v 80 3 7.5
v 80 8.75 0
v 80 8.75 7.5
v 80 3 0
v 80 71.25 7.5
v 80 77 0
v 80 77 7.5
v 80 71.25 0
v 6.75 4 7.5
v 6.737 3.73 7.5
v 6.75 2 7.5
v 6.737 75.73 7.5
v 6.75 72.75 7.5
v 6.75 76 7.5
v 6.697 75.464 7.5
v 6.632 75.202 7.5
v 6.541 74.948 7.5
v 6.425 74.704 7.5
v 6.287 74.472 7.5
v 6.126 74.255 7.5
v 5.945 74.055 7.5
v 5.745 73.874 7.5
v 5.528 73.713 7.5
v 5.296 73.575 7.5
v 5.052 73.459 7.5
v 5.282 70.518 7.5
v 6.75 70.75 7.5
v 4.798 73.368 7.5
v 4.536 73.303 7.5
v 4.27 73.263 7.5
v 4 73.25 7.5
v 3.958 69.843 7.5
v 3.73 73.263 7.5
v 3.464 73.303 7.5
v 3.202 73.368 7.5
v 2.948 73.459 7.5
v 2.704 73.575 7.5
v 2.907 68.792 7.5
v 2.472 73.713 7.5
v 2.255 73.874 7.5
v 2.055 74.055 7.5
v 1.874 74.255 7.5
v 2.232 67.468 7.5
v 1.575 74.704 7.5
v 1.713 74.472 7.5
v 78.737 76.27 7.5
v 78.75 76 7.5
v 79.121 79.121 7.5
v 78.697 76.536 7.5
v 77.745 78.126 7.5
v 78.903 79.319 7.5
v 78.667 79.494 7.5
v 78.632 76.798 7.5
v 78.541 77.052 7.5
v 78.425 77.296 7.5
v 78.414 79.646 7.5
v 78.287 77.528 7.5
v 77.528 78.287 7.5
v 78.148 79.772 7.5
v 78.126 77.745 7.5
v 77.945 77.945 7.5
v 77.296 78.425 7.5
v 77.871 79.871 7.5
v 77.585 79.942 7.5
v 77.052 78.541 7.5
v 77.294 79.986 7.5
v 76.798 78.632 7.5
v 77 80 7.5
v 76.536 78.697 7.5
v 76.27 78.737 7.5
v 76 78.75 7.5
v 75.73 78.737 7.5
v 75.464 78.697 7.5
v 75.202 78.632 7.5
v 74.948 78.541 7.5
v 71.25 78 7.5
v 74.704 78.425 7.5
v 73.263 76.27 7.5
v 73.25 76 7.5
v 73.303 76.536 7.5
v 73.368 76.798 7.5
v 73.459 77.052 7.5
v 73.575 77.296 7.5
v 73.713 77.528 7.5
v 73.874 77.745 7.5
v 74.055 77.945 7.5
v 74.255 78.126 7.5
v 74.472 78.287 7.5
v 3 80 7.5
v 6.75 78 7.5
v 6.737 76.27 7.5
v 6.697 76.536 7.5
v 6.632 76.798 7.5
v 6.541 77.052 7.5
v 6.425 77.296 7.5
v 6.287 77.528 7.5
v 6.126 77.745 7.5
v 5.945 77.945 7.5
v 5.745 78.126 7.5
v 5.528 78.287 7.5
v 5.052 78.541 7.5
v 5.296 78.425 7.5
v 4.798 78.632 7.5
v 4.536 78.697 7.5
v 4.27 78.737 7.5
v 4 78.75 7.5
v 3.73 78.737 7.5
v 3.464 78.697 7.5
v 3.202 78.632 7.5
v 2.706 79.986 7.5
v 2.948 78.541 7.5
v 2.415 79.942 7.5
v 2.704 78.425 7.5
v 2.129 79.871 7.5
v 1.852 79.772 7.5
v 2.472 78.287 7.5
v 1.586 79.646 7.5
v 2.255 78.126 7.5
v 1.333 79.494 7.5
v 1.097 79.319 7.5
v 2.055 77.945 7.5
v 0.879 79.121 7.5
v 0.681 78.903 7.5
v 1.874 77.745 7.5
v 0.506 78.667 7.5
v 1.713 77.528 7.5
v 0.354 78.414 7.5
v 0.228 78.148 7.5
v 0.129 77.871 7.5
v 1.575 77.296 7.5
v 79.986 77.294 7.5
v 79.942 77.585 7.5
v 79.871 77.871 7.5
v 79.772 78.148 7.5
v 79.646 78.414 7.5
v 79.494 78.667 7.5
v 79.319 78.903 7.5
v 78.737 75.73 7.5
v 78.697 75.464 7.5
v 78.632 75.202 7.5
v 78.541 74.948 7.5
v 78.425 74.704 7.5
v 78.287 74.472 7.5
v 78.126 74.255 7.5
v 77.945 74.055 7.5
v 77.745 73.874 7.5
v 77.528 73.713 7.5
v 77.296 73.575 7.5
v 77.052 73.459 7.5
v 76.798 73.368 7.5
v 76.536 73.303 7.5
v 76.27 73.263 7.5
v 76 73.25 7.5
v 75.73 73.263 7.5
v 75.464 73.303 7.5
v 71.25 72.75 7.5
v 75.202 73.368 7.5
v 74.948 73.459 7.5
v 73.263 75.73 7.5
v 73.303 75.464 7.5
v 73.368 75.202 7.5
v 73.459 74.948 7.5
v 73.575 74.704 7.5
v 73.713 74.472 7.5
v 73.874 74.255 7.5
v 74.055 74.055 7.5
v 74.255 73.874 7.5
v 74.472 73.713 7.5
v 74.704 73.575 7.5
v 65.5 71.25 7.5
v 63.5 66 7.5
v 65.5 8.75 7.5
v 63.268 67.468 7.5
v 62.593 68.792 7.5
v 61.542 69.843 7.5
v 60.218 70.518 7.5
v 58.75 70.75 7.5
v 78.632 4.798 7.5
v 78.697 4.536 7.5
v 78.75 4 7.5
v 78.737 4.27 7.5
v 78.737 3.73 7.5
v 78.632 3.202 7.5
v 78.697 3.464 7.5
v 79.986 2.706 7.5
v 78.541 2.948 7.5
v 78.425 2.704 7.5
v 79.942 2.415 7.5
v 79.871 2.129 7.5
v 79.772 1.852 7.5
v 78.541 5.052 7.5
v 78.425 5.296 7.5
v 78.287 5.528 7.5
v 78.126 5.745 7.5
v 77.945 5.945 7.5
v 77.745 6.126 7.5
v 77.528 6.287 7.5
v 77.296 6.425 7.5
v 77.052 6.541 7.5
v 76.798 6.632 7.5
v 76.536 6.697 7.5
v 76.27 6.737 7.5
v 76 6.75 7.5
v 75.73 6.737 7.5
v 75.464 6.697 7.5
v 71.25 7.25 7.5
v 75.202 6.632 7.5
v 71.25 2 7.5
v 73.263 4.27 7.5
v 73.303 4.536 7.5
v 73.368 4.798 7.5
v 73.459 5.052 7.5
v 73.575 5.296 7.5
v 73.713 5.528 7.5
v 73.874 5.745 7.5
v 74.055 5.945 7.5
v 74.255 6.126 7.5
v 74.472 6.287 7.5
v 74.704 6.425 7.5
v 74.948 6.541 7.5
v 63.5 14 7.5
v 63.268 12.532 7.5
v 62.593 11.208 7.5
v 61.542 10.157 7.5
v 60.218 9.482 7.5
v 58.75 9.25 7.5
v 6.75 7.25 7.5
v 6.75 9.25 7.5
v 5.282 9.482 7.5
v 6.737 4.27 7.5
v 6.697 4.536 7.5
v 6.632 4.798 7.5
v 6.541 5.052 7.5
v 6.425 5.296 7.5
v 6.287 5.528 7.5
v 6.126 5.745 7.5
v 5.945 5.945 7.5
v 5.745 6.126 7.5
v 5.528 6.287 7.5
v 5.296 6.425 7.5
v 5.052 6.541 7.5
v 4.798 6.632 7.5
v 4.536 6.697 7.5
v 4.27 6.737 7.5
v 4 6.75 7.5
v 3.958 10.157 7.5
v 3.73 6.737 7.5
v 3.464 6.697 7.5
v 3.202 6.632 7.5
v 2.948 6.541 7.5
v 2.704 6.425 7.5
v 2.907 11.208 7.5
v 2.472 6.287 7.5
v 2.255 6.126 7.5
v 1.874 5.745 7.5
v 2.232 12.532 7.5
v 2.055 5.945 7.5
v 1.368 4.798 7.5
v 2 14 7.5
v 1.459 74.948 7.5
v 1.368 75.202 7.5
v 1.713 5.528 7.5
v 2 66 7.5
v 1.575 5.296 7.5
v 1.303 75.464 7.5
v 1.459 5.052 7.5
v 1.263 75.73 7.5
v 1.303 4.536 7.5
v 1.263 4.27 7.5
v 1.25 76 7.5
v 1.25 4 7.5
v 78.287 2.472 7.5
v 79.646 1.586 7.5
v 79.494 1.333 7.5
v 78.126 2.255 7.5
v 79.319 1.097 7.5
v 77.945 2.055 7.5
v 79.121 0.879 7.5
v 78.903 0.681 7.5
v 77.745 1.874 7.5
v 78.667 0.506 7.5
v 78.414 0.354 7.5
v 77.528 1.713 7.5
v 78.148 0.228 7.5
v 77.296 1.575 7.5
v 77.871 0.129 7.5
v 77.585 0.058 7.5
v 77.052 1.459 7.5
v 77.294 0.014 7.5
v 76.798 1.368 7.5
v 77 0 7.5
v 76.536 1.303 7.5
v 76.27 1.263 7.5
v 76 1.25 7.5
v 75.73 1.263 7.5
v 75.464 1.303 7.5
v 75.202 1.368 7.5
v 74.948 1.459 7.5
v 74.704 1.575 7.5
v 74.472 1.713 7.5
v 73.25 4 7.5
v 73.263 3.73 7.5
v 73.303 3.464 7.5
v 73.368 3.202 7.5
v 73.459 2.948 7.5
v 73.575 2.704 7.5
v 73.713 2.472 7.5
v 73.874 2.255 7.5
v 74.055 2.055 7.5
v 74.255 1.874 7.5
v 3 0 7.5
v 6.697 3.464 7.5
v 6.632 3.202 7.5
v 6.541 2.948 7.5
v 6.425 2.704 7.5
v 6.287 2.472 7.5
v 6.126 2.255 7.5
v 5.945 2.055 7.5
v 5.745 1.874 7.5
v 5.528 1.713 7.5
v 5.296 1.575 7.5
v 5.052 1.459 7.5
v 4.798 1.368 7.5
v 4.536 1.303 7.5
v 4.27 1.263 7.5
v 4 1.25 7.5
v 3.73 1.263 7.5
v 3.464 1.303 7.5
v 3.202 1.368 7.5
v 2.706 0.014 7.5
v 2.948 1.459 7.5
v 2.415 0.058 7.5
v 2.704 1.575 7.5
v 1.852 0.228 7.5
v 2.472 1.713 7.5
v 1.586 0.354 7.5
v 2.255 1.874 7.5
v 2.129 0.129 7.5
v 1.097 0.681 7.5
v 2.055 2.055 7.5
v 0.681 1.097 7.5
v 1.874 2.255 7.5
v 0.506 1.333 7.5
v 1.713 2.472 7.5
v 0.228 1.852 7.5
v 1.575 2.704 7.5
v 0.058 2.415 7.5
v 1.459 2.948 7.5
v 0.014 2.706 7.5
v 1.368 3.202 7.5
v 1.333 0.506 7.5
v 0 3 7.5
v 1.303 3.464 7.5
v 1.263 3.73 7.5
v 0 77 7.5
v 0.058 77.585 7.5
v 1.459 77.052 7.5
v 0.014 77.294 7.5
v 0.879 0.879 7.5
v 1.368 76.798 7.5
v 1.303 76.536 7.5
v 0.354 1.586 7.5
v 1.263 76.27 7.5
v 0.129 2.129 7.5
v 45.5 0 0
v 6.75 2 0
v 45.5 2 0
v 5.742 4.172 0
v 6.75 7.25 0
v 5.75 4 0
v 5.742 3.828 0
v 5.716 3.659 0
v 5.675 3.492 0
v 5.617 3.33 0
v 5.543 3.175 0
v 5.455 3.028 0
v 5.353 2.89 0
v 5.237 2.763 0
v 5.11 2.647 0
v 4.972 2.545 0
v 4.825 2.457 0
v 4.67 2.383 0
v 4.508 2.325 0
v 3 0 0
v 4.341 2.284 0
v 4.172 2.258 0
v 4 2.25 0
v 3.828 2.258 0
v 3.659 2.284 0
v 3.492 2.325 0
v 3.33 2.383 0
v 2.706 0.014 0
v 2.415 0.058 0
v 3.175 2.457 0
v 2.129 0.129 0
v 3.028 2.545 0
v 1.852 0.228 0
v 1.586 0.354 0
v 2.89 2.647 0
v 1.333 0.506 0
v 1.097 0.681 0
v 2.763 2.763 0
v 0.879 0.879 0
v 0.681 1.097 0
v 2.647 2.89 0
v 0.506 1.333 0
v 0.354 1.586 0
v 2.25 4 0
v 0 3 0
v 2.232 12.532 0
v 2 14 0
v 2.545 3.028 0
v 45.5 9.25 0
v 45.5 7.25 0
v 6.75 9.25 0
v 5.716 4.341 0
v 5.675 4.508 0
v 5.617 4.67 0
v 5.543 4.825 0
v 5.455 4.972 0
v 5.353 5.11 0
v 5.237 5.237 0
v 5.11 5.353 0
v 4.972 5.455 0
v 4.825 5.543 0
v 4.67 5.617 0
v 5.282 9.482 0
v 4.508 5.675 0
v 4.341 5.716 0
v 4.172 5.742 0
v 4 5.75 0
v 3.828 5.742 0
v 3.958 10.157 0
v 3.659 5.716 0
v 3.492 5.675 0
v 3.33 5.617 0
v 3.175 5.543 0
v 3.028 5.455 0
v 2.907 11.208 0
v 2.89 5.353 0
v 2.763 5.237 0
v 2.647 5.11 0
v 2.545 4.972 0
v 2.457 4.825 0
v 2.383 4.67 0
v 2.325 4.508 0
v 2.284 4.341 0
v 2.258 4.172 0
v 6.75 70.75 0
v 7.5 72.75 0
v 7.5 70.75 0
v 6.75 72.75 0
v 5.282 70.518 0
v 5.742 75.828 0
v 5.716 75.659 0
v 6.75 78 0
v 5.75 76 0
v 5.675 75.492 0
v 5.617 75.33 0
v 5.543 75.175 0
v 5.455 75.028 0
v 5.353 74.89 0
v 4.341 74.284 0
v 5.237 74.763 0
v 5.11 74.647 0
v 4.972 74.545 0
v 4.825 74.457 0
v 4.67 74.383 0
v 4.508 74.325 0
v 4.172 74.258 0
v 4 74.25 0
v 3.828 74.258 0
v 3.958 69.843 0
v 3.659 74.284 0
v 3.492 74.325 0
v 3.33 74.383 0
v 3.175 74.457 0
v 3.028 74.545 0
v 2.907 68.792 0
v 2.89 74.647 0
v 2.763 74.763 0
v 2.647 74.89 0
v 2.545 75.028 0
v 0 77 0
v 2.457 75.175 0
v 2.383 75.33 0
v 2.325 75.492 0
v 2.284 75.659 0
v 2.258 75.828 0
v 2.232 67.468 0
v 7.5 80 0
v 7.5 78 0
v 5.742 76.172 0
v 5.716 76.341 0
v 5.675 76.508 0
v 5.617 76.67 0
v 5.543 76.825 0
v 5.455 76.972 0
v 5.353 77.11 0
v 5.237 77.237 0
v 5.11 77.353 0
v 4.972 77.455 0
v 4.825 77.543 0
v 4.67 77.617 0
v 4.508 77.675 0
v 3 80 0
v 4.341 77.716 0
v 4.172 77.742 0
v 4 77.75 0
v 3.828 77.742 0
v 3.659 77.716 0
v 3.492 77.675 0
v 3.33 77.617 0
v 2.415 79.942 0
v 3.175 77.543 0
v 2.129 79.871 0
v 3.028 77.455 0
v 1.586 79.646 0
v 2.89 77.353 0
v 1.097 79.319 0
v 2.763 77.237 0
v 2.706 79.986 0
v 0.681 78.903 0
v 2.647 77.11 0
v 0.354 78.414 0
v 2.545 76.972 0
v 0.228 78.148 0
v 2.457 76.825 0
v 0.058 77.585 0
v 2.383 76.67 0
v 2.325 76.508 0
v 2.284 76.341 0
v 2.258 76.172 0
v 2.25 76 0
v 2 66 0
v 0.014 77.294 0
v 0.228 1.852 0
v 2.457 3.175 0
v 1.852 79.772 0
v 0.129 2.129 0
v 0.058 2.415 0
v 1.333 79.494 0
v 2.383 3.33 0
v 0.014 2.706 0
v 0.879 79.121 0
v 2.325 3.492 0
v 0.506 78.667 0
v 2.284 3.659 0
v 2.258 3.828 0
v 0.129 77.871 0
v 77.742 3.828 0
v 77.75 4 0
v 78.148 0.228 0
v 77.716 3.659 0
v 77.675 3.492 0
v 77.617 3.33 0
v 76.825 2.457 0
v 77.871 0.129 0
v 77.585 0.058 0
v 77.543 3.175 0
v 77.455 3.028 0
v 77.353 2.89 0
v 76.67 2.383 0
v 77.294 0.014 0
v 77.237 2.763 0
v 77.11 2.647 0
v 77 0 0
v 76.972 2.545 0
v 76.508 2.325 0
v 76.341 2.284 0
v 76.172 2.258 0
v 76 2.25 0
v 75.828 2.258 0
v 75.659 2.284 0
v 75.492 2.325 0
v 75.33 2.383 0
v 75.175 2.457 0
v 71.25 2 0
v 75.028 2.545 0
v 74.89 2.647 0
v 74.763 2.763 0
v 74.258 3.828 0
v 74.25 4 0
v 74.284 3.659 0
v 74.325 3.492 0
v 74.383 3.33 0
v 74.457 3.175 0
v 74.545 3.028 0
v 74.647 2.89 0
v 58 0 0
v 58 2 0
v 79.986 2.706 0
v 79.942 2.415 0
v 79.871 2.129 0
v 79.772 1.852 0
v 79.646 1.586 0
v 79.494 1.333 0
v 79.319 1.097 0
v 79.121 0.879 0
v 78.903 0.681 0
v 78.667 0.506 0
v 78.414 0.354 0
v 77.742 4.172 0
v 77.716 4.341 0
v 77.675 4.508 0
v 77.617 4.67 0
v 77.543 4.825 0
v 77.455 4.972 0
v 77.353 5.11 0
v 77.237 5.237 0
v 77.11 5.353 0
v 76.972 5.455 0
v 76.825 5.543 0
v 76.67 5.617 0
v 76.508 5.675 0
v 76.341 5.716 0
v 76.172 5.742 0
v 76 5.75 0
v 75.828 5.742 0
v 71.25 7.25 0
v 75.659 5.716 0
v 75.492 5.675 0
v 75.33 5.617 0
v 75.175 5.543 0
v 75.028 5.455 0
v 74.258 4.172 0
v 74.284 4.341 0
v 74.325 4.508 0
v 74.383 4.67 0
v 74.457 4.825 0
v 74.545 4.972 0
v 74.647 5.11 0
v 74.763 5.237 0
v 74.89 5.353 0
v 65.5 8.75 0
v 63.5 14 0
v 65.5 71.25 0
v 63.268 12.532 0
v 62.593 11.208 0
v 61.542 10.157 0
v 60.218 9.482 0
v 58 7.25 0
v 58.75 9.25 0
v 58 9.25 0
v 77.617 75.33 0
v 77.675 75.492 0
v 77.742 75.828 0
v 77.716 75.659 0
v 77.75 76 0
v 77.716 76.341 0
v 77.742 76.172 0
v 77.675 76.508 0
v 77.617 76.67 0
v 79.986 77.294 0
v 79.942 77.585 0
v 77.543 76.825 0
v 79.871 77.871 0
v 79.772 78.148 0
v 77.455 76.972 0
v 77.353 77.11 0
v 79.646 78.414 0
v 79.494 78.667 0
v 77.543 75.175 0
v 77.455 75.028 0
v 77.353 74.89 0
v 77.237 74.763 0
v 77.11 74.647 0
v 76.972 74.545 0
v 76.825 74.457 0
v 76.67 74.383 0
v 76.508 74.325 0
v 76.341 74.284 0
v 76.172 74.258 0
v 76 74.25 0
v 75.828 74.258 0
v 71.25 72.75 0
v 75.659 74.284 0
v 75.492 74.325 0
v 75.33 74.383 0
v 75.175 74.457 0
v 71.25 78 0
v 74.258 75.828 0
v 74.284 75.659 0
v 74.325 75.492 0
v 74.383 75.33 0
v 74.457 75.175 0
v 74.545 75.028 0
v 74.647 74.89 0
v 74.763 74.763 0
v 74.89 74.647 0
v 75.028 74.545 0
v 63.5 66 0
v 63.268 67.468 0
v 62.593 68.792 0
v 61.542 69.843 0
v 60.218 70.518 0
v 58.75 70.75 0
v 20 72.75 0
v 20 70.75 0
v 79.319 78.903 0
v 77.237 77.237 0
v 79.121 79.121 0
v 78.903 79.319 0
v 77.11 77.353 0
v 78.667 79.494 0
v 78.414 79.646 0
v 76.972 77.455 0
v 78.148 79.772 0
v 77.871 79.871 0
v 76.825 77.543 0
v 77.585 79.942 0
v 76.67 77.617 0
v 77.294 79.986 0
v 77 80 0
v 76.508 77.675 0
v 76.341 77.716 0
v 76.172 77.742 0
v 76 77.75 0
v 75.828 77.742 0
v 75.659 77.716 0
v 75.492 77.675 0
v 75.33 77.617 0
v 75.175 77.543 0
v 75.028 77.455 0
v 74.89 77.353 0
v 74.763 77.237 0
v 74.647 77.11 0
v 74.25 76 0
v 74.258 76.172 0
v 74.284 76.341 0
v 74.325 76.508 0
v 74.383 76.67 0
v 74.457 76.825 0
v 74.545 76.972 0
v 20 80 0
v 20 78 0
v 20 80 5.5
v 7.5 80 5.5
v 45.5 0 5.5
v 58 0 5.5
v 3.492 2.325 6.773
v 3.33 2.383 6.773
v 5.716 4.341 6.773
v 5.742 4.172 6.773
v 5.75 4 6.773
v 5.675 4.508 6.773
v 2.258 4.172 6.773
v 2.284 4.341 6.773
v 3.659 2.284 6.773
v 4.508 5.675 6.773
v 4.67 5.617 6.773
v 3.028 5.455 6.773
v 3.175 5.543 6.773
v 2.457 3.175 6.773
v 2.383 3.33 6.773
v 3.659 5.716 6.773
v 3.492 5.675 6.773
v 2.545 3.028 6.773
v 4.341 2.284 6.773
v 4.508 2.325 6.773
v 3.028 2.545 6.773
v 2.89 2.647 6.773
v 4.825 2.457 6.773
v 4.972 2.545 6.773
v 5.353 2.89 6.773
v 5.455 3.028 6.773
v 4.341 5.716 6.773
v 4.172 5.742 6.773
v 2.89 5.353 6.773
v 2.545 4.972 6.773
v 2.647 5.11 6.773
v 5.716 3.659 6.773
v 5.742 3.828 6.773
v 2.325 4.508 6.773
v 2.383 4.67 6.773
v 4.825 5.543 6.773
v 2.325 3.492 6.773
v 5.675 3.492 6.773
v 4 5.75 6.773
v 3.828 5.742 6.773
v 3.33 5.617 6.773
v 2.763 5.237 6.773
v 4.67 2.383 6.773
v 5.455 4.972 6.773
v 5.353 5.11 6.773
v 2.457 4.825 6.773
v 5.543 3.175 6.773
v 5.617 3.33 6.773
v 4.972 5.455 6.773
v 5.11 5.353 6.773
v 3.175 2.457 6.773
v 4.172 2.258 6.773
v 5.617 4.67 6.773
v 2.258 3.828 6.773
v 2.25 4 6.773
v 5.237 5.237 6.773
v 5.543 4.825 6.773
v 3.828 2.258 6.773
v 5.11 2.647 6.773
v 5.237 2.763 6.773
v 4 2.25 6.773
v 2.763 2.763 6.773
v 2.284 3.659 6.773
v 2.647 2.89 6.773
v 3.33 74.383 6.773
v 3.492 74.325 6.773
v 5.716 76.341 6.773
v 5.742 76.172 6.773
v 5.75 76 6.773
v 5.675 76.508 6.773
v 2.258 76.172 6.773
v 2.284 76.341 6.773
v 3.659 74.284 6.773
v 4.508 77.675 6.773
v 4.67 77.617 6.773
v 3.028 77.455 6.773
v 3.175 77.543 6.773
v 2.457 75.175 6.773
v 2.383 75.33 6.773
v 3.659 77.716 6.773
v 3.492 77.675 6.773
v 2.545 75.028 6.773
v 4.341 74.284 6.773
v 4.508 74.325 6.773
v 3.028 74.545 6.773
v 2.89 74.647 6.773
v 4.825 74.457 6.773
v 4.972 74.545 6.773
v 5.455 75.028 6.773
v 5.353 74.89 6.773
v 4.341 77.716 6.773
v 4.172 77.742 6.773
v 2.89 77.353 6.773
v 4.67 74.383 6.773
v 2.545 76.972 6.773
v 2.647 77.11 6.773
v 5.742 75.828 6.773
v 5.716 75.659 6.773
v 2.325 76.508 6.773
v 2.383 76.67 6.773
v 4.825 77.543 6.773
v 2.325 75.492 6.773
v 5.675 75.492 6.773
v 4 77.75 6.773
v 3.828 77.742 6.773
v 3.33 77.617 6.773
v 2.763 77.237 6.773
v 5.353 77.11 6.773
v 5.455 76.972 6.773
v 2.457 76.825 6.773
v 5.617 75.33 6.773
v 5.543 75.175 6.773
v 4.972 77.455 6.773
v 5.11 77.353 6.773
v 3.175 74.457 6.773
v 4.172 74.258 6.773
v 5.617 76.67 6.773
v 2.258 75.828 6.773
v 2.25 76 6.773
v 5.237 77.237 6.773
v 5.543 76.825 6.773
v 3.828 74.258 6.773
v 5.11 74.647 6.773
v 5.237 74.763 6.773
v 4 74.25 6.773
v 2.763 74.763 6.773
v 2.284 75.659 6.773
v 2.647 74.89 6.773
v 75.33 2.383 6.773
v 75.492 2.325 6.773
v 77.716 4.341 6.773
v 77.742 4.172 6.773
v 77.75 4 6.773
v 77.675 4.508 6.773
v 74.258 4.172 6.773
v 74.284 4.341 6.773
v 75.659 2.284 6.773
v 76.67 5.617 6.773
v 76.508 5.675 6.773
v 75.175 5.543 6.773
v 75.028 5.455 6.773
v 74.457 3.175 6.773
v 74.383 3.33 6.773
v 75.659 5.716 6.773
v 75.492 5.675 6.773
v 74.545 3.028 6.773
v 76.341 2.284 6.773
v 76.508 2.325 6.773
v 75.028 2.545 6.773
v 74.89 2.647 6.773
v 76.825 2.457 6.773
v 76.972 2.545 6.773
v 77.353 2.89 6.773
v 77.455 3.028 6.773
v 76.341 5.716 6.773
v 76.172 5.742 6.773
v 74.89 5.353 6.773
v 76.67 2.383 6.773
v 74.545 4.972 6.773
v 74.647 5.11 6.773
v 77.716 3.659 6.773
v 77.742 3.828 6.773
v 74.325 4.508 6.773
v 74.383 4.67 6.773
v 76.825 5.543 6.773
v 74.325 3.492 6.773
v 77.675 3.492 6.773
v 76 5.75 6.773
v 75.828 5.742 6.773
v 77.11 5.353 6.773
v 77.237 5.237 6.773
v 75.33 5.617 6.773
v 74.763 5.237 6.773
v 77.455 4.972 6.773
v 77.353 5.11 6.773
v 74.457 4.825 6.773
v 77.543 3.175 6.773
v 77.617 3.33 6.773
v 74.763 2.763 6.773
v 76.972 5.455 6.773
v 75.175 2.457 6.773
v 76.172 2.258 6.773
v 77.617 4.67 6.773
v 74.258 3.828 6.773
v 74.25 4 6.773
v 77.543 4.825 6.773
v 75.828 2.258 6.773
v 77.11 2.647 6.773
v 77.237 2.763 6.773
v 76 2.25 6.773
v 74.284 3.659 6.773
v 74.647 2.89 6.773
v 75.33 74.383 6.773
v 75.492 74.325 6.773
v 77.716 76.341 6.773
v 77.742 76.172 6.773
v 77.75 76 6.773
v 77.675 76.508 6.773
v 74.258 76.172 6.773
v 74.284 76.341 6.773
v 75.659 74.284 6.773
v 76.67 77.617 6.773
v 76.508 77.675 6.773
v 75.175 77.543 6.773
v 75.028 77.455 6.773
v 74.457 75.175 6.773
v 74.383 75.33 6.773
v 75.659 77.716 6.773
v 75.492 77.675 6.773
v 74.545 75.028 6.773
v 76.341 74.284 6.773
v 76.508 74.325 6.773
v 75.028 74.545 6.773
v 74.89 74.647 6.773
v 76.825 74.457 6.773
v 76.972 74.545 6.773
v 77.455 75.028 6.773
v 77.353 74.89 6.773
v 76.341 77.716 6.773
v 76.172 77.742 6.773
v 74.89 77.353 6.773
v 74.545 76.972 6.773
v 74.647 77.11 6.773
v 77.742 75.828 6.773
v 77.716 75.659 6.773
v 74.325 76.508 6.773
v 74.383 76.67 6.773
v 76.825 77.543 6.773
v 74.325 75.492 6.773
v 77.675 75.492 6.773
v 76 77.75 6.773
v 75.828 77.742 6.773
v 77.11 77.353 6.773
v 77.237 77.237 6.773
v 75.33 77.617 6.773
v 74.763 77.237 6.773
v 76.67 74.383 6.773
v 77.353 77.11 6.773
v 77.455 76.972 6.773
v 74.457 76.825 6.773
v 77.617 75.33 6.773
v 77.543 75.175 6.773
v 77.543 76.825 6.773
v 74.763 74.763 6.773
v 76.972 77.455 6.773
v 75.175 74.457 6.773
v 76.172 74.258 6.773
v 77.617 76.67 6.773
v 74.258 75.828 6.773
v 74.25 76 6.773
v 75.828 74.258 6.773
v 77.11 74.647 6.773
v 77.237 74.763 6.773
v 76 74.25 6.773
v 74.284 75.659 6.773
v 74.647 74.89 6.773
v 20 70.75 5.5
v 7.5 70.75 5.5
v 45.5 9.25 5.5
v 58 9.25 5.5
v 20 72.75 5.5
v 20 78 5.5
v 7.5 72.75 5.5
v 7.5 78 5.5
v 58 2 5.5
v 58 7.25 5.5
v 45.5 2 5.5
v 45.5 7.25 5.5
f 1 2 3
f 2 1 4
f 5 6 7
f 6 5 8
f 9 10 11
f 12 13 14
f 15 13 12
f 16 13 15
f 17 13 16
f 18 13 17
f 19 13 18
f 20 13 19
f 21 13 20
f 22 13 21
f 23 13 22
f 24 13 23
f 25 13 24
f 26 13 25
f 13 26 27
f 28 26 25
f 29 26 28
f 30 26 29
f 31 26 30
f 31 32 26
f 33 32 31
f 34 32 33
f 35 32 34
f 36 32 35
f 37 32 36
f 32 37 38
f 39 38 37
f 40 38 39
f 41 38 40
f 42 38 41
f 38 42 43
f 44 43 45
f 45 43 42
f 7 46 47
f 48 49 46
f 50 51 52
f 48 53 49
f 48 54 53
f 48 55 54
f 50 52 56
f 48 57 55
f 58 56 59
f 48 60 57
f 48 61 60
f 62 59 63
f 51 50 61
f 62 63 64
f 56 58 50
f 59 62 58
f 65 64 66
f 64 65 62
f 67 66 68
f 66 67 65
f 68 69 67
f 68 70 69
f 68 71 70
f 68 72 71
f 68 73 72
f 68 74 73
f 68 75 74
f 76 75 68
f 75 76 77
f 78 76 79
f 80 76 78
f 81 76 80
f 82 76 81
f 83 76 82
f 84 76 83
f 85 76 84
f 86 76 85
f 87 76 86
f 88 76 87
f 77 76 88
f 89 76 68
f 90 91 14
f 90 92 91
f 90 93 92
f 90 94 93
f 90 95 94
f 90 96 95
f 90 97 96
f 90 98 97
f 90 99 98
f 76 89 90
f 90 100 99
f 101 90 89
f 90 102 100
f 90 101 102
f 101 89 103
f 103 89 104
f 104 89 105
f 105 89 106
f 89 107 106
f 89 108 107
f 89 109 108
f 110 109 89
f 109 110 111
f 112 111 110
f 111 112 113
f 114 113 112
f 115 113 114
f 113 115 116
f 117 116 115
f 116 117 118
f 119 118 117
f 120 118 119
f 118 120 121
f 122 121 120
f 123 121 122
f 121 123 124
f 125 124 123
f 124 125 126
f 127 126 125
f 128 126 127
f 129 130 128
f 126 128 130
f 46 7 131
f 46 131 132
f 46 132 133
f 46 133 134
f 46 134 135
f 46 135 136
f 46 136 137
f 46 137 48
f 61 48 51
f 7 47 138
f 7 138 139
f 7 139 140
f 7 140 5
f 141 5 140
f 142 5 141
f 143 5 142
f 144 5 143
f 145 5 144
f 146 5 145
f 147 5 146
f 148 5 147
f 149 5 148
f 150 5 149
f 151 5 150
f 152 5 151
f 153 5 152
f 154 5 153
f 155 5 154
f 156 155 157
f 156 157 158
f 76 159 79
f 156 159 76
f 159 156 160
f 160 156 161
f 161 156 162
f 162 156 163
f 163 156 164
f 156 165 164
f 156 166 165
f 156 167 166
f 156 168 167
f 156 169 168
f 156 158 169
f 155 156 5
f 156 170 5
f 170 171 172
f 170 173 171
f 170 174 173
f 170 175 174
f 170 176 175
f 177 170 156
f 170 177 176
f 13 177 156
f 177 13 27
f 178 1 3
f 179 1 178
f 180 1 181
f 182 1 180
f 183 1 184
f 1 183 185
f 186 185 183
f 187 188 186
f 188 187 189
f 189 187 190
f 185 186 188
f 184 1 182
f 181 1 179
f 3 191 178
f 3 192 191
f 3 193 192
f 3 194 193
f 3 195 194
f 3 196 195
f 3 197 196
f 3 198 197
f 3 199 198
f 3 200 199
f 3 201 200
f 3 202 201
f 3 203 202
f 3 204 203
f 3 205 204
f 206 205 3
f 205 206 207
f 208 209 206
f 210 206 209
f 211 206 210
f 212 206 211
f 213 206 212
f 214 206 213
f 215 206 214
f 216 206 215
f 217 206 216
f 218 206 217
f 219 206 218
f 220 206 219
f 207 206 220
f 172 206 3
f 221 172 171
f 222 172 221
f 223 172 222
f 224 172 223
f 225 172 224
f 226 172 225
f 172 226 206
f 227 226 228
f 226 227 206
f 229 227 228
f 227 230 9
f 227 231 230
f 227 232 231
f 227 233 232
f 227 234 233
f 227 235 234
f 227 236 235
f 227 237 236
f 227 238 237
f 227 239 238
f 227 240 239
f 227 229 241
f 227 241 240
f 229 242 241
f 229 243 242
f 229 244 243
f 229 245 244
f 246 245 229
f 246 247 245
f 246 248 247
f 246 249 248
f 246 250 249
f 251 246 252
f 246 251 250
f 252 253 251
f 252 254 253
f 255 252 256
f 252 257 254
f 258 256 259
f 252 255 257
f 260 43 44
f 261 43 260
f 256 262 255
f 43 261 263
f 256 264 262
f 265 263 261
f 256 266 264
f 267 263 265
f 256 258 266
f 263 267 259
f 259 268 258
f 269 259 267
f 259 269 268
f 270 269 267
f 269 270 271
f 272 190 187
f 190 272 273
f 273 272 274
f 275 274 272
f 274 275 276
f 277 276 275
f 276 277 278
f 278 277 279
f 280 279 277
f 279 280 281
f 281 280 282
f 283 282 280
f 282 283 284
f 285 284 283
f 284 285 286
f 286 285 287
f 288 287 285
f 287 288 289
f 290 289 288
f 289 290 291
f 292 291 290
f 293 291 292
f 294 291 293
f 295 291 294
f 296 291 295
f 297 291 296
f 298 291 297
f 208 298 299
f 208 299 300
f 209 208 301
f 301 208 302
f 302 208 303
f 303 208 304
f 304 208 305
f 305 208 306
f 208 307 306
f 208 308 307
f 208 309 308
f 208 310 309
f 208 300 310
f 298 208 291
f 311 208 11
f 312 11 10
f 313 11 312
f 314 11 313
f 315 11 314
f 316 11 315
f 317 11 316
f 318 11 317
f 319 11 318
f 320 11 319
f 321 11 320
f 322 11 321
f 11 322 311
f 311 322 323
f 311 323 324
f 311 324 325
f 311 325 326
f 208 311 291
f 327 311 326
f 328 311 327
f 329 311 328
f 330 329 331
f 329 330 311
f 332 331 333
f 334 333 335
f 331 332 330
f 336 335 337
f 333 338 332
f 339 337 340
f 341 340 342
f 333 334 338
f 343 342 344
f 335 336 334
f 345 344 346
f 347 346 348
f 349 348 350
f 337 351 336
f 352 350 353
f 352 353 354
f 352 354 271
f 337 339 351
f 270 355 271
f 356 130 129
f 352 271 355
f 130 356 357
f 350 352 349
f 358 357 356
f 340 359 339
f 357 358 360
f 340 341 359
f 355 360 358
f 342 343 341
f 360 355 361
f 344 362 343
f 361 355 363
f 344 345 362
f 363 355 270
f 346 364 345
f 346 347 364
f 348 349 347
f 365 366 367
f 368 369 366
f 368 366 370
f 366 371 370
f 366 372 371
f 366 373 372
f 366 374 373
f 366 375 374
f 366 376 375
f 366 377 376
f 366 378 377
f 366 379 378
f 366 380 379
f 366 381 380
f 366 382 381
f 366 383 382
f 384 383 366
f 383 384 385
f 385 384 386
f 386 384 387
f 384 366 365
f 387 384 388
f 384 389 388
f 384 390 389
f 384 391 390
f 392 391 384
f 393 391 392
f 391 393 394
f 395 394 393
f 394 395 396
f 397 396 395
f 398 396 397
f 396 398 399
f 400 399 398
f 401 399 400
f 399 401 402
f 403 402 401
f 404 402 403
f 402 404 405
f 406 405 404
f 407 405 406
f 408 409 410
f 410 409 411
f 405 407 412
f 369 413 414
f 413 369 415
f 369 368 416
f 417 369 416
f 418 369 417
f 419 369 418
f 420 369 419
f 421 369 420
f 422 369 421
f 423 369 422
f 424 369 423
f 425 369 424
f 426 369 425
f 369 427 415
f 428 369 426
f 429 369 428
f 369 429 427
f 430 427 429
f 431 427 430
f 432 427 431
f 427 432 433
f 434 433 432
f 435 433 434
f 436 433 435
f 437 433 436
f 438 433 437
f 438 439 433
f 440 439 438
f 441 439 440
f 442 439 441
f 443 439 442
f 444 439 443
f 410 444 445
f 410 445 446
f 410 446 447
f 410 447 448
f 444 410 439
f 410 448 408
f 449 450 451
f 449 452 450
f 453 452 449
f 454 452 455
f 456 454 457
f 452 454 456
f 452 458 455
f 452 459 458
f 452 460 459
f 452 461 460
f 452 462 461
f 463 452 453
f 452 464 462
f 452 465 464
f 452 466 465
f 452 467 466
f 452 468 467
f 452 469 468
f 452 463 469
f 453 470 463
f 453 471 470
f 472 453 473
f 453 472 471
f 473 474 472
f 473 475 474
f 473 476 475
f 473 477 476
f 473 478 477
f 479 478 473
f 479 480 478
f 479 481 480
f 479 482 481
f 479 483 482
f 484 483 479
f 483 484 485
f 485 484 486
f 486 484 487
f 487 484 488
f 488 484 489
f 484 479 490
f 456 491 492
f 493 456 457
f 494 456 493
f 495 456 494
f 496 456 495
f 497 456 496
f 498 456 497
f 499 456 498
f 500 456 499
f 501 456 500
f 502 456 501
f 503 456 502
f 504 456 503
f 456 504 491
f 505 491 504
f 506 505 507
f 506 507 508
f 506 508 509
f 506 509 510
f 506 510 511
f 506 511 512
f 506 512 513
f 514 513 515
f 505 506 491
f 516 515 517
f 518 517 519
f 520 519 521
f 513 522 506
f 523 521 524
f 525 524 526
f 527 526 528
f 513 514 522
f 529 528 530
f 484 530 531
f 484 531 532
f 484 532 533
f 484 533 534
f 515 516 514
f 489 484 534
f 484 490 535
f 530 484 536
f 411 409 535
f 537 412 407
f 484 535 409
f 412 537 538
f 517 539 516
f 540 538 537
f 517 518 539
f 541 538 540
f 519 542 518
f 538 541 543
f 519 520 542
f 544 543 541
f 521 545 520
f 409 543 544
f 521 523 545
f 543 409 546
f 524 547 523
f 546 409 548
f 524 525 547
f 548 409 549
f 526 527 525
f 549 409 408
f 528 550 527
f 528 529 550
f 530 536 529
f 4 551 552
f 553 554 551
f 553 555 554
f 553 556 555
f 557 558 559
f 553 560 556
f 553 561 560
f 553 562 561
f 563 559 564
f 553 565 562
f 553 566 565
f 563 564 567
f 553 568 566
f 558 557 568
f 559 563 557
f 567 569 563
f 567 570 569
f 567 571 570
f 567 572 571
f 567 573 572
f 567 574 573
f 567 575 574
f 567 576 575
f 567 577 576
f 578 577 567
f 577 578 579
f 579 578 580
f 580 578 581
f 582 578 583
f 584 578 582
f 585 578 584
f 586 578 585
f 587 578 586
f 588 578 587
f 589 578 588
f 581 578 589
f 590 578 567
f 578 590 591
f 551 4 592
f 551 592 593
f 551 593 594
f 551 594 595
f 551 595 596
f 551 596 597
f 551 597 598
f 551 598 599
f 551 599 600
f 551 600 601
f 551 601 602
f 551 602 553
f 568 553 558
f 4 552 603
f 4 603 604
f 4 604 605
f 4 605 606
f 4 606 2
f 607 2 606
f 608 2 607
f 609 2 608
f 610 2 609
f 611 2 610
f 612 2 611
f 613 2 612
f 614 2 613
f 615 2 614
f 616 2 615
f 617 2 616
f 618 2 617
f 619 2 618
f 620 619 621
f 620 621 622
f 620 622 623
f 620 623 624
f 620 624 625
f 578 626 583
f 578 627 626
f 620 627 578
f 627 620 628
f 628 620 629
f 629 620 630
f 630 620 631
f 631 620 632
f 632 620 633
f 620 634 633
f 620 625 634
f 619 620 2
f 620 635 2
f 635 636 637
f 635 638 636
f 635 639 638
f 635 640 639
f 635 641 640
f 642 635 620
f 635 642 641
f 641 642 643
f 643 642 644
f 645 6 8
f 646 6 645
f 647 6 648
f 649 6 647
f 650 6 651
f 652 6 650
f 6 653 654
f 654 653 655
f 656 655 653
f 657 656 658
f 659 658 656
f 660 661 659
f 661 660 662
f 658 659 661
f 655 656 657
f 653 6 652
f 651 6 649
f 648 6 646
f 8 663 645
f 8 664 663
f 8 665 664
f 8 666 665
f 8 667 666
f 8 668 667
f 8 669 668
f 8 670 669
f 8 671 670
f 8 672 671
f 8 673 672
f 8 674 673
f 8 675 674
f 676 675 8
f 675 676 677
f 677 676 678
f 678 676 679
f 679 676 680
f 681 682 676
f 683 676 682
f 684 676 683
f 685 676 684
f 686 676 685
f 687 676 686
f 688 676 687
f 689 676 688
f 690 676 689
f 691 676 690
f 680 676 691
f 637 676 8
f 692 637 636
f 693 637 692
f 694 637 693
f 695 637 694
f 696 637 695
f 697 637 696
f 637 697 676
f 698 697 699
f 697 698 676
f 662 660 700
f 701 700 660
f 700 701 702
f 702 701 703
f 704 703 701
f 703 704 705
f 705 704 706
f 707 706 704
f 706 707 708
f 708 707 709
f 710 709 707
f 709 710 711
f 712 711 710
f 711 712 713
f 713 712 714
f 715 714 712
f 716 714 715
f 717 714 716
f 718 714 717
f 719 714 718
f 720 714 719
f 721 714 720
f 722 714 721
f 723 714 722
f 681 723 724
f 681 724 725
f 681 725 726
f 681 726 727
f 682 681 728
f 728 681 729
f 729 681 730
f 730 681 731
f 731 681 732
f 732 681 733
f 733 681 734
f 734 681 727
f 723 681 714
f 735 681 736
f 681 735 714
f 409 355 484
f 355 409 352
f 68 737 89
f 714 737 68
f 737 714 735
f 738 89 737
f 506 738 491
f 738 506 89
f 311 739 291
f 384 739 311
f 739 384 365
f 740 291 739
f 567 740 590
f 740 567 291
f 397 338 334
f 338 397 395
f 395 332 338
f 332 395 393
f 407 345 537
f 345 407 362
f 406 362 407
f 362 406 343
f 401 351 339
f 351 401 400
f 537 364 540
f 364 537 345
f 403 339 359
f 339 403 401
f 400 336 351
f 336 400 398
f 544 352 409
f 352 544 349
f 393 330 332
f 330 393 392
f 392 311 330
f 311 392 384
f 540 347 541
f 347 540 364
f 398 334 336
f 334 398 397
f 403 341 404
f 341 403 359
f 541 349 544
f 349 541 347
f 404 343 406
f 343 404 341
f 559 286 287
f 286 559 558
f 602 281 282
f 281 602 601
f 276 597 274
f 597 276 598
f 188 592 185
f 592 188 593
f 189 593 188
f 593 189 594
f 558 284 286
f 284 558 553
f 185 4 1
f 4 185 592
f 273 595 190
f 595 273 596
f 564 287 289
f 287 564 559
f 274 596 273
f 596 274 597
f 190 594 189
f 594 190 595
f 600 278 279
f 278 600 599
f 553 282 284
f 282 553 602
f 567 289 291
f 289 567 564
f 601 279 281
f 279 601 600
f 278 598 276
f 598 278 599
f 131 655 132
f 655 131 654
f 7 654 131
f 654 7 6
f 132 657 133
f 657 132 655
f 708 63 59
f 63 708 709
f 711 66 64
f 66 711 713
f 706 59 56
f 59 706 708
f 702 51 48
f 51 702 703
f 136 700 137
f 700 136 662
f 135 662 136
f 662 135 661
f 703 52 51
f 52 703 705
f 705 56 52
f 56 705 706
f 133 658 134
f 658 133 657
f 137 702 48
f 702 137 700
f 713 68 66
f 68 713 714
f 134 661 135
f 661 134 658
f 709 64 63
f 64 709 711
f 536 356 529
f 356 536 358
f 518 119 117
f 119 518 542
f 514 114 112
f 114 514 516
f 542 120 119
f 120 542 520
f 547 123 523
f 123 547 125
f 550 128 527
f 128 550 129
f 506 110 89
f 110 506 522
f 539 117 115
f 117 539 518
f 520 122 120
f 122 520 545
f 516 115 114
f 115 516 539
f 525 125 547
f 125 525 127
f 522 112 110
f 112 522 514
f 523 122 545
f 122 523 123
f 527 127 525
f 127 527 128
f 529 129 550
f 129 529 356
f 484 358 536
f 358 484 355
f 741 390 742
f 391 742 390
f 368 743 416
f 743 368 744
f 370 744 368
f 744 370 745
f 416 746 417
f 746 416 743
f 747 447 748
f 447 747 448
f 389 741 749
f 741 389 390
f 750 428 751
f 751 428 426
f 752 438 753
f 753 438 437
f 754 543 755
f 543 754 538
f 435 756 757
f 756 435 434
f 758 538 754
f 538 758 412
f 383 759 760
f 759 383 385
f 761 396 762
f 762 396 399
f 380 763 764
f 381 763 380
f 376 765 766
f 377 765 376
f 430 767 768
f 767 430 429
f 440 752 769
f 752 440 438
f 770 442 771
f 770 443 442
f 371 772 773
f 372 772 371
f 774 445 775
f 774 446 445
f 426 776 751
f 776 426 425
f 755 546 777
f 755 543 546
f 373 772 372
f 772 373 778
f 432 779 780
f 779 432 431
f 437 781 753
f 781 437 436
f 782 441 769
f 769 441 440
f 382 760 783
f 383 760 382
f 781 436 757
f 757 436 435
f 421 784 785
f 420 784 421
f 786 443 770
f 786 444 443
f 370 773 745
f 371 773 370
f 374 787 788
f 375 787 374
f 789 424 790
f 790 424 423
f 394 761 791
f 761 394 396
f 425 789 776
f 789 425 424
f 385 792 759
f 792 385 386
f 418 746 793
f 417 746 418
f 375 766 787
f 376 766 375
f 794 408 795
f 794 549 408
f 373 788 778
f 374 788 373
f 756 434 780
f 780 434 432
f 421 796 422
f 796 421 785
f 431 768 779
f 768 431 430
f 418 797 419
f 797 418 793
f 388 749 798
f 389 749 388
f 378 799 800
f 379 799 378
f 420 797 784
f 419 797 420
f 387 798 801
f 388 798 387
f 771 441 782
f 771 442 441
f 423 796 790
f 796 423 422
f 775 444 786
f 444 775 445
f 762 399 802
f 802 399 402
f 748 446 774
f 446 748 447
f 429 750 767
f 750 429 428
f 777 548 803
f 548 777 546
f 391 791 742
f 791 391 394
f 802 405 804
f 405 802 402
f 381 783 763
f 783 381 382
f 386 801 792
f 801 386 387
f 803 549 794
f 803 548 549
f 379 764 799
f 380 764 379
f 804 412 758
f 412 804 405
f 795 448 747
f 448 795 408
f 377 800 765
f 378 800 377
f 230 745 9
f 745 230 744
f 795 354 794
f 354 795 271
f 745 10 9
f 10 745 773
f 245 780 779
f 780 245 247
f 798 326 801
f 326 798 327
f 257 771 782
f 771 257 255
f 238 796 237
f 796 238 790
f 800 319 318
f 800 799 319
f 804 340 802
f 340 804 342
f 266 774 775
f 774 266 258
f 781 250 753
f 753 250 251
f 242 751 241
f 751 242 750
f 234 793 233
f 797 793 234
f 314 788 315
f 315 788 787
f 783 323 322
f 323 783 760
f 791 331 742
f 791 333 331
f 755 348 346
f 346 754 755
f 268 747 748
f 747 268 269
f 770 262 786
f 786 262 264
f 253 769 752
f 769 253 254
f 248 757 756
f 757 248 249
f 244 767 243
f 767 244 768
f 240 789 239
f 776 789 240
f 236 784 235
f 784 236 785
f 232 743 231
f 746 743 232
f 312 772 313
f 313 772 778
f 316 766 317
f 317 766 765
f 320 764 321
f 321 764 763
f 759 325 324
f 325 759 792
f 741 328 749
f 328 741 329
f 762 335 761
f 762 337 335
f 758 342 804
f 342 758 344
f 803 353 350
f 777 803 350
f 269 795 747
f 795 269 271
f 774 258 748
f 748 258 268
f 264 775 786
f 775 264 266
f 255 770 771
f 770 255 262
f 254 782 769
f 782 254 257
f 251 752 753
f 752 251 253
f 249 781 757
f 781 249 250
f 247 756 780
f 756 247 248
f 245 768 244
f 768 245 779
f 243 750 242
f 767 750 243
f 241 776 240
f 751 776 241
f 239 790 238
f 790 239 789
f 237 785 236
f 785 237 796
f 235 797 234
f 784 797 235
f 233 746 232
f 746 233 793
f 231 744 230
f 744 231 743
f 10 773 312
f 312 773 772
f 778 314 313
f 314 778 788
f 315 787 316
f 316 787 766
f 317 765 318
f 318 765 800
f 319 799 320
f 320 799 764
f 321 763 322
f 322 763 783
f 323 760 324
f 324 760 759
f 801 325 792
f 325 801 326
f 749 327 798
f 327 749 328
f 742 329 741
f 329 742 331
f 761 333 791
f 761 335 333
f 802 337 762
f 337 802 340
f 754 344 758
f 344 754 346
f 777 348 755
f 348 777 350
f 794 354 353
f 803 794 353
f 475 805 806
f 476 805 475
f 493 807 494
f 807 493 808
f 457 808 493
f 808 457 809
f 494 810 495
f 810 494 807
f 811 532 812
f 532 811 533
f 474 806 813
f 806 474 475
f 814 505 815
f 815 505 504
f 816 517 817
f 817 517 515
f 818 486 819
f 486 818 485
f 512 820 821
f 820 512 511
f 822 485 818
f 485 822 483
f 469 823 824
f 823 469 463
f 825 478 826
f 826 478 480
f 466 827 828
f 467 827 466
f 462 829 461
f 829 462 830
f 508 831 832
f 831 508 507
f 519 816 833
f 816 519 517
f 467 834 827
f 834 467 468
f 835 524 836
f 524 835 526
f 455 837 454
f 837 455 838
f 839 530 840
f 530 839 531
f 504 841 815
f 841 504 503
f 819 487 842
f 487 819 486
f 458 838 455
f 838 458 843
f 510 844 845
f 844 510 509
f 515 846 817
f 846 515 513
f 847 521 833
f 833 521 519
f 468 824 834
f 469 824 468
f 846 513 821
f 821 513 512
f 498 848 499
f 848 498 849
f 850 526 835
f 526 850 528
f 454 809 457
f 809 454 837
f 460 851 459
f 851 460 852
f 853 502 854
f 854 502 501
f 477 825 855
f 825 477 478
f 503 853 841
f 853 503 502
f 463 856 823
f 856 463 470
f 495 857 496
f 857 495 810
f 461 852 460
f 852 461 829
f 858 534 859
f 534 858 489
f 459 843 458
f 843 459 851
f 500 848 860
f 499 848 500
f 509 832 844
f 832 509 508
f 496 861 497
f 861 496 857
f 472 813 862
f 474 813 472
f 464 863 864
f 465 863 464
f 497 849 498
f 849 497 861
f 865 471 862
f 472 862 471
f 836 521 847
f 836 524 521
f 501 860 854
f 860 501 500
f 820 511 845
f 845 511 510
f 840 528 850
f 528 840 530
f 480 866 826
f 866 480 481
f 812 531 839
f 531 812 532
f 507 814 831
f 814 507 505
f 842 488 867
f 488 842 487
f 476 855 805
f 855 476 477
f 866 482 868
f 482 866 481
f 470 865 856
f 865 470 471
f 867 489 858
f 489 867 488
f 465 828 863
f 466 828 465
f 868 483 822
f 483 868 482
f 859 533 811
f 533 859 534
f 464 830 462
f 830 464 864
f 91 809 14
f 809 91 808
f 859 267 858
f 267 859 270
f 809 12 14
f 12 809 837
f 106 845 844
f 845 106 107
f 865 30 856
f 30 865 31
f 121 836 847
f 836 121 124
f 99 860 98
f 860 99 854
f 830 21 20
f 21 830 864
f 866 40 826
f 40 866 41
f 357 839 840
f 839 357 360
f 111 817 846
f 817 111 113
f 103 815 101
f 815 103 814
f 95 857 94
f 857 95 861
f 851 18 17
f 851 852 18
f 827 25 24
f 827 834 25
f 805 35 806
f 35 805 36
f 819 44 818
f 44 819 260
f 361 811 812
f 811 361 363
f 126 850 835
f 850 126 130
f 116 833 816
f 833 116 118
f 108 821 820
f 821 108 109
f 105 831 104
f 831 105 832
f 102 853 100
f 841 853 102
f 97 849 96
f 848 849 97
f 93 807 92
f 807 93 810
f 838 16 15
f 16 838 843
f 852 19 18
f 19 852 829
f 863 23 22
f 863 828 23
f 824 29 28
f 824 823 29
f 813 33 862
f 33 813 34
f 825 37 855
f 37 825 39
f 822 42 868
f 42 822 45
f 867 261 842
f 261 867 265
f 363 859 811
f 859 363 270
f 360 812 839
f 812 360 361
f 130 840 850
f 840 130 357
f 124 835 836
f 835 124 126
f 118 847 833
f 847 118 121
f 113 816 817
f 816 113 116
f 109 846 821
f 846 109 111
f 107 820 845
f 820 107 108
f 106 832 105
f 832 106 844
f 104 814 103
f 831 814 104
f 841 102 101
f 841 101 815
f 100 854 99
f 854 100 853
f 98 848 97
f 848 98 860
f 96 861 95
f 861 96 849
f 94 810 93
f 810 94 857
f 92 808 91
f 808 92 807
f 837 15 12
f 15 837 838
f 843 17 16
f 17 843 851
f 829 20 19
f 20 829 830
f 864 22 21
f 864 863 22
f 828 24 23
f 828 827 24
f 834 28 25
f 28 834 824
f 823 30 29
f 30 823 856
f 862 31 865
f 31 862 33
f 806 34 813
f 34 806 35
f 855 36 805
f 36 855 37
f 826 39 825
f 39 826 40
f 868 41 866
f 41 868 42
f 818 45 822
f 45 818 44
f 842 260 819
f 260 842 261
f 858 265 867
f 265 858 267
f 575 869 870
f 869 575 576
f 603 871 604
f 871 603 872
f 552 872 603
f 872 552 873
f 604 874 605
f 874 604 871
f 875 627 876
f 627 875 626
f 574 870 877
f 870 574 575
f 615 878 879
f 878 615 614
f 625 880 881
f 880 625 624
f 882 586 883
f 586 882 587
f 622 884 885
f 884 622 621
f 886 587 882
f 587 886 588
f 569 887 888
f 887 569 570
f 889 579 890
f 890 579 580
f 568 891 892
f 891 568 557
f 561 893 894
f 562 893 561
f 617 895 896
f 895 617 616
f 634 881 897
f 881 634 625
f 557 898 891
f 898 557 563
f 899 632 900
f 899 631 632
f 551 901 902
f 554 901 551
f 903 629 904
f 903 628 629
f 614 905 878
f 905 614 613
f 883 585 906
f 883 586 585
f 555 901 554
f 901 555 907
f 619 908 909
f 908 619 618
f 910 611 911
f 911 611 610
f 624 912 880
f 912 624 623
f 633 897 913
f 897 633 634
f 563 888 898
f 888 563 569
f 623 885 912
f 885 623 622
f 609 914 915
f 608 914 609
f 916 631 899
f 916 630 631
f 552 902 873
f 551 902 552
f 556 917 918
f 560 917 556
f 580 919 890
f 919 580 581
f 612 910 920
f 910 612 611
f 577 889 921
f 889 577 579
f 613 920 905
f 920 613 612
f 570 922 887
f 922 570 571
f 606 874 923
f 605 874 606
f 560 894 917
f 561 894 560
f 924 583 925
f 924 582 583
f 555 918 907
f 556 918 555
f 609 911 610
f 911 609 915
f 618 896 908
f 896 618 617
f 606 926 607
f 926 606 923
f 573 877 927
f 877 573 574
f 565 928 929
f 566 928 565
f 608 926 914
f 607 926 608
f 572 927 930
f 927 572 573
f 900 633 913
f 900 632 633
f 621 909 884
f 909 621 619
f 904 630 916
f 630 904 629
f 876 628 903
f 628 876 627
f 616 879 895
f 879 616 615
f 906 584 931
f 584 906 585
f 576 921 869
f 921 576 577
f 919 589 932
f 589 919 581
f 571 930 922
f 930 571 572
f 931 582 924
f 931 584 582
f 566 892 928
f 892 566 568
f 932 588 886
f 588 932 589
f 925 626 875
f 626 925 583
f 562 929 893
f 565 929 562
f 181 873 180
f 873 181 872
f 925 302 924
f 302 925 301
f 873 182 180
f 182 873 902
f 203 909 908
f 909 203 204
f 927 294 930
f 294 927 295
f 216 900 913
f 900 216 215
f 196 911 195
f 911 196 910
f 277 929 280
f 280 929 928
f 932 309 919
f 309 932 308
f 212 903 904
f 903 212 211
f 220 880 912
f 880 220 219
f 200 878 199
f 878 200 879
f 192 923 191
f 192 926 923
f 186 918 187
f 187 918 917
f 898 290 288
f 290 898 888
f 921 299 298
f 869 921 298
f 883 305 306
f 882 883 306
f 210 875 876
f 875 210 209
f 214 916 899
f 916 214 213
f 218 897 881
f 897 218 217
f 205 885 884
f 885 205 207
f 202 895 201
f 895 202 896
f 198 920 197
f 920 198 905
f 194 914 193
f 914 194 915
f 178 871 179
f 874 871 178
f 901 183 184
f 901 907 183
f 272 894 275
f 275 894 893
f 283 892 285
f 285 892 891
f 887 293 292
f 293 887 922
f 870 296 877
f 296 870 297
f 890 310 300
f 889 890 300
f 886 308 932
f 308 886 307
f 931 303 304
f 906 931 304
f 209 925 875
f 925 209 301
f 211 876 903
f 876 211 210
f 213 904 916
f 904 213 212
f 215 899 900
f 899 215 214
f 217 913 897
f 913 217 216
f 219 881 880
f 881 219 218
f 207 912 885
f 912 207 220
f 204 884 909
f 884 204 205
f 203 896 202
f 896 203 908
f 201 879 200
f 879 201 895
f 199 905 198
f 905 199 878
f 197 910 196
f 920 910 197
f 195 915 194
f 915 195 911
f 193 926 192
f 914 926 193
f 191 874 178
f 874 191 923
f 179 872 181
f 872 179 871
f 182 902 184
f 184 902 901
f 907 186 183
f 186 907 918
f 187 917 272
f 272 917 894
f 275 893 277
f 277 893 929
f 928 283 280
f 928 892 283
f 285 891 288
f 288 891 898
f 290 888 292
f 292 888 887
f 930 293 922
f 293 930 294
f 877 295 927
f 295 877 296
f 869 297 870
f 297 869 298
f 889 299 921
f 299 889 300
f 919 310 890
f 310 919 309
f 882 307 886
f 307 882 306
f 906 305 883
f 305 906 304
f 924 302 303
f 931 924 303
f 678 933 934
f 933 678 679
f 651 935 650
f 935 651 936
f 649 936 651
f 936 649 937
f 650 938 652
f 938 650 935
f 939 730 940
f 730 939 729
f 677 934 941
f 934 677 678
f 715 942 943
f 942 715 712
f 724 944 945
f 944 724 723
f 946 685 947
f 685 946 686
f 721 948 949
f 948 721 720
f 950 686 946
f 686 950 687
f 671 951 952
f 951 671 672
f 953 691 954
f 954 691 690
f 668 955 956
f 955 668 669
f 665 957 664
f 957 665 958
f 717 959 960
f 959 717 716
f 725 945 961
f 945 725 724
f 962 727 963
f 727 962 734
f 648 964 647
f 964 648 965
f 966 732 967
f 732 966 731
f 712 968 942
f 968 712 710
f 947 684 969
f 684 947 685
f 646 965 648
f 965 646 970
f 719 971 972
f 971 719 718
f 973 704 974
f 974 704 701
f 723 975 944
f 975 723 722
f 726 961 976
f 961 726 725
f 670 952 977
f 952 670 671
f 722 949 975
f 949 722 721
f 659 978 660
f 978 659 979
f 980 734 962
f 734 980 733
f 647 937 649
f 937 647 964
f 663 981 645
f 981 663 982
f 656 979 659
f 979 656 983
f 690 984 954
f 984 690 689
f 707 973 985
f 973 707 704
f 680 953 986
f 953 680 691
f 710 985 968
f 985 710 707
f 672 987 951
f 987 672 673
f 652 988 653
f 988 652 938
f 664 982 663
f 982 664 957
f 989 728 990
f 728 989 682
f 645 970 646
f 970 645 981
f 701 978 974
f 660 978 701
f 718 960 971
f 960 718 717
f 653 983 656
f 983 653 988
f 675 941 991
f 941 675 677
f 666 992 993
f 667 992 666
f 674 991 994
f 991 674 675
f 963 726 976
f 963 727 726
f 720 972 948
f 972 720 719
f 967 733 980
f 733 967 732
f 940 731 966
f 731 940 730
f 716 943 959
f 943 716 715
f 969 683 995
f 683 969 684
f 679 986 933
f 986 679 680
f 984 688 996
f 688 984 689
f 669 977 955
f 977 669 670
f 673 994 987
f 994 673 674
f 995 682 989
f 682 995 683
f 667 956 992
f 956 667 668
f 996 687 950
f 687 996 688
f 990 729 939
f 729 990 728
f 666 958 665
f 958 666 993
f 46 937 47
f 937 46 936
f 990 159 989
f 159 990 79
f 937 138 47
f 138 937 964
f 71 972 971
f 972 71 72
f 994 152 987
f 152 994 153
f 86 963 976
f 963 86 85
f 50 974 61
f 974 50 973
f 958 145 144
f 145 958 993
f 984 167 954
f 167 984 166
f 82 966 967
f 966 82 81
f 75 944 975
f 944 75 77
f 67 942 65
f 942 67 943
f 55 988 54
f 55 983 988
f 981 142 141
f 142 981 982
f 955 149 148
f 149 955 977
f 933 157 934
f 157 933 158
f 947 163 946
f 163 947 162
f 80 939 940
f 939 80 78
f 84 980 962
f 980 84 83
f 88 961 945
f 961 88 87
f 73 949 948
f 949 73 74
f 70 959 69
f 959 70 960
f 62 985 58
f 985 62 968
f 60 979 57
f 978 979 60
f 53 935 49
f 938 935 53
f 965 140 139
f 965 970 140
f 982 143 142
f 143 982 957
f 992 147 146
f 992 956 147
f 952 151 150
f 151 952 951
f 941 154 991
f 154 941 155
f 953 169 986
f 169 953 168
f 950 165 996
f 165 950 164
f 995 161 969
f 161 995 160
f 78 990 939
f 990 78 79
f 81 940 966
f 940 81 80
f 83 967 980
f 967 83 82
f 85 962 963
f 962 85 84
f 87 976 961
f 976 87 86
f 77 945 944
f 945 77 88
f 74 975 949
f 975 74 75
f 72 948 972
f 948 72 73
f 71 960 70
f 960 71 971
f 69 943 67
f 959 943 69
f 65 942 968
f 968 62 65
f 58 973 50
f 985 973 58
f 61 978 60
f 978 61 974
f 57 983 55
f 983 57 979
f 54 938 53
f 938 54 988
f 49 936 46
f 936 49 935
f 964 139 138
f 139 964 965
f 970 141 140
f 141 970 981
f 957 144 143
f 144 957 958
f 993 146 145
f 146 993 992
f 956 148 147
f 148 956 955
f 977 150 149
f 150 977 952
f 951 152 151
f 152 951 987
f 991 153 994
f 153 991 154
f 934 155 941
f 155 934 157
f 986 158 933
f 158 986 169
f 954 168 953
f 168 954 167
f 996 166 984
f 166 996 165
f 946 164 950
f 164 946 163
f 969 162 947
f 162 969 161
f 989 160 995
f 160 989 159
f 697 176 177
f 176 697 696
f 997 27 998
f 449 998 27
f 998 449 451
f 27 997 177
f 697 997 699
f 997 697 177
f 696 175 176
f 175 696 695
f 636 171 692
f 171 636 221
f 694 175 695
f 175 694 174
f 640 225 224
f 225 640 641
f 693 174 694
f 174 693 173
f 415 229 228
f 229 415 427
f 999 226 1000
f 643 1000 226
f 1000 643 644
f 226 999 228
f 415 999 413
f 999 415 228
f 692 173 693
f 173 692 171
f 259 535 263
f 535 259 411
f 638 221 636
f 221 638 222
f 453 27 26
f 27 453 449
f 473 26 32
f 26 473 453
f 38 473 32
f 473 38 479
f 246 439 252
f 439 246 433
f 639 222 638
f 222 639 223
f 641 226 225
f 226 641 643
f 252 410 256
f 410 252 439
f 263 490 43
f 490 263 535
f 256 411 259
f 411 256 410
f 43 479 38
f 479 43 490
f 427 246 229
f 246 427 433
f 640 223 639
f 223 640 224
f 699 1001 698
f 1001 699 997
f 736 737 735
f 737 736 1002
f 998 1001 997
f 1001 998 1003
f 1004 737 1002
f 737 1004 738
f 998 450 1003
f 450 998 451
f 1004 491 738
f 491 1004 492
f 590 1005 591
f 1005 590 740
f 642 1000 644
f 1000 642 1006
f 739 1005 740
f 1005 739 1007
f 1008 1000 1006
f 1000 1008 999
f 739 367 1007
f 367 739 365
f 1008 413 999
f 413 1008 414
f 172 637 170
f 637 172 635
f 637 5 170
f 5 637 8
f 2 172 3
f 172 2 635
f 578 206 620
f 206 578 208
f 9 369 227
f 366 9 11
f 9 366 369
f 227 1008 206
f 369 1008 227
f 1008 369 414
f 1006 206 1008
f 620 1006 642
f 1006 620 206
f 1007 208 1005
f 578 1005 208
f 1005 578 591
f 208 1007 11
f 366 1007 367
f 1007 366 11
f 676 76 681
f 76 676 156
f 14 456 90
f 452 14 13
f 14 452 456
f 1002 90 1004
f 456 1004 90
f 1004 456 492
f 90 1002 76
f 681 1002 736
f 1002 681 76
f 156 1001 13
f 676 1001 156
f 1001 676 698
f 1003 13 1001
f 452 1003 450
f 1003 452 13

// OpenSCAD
/* [Size and thickness] */
// fan size in mm
fan_size = 80; // [40:20:200]

tab_width_outer=88.1;
tab_height=13.5;
tab_width=12.5;
tab_offset=5.5;
heater_size=61.5;
heater_straight=52;
heater_depth=4.5;
space_after_depth=3;
fan_depth=heater_depth+space_after_depth;

// fan grill thickness in mm
grill_thickness = fan_depth;

// plastic thickness around the fan hole in mm
vent_wall_thickness = 1;

fan_duct_chamfer = false;

// screw hole type
screw_hole_type = "t"; // [s:Straight, t:Tapered, i:Inset]

/* [Vent grill bars] */
// number of horzontal grill bars
horizontal_bar_count = 1;
// number of vertical grill bars
vertical_bar_count = 1;

// grill bars thickness
bars_thickness = 1;

// grill bars width
bars_width = 1.2;

/* [Hidden] */
$fn = 64;

screw_hole_diameter = 3.5;
screw_hole_radius = screw_hole_diameter / 2;
screw_hole_radius_wider = screw_hole_radius + 1;
screw_support_thickness = 1;
screw_center_distance_from_edge = 4;

module PrimeShape() {
        union() {
        difference() {
            cube([fan_size, fan_size, grill_thickness]);
            
            // corner chamfer
            translate([3,0,-1])
            rotate([0,0,135])
            cube([5, 5, grill_thickness + 2]);

            translate([fan_size-3,0,-1])
            rotate([0,0,-45])
            cube([5, 5, grill_thickness + 2]);

            translate([fan_size,fan_size-3,-1])
            rotate([0,0,45])
            cube([5, 5, grill_thickness + 2]);

            translate([0,fan_size-3,-1])
            rotate([0,0,45])
            cube([5, 5, grill_thickness + 2]);
        }

        // corner roundness
        translate([3,3,grill_thickness/2])
        cylinder(r=3, h=grill_thickness, center=true);

        translate([fan_size-3,3,grill_thickness/2])
        cylinder(r=3, h=grill_thickness, center=true);

        translate([fan_size-3,fan_size-3,grill_thickness/2])
        cylinder(r=3, h=grill_thickness, center=true);

        translate([3,fan_size-3,grill_thickness/2])
        cylinder(r=3, h=grill_thickness, center=true);
    }
}

module PrimeShapeWithScrewHoles() {
    difference() {
        PrimeShape();

        // screw holes
        ScrewHole(screw_center_distance_from_edge, screw_center_distance_from_edge);
        ScrewHole(screw_center_distance_from_edge, fan_size - screw_center_distance_from_edge);
        ScrewHole(fan_size - screw_center_distance_from_edge, screw_center_distance_from_edge);
        ScrewHole(fan_size - screw_center_distance_from_edge, fan_size - screw_center_distance_from_edge);
    }
}

module ScrewHole(x, y) {
    translate([x, y, grill_thickness / 2])
    cylinder(r=screw_hole_diameter / 2, h=grill_thickness + 2, center=true);

    if (screw_hole_type == "i") {
        //inset
        translate([x, y, grill_thickness / 2 + screw_support_thickness])
        cylinder(r=screw_hole_radius + 1, h=grill_thickness, center=true);
    }

    if (screw_hole_type == "t") {
        // tapered
        translate([x, y, grill_thickness])
        cylinder(r1=0, r2=screw_hole_radius_wider * 2, h=4, center=true);
    }
}


module rounded_rect(width, height, corner_radius, extrude_height) {
    linear_extrude(extrude_height)
    minkowski() {
        square([width - 2*corner_radius, height - 2*corner_radius], center=true);
        circle(r=corner_radius,$fn=20);
    }
}

wall_size=2;
past_screw=screw_center_distance_from_edge+screw_hole_radius_wider;
side_size_diff=(fan_size-heater_size-wall_size*4)/2;
size_diff =fan_size - heater_size;
fan_offset = size_diff/2-wall_size;
hole_height=heater_size + wall_size*2;
hole_width=fan_size-(past_screw+wall_size)*2;
difference(){
    PrimeShapeWithScrewHoles();
    translate([(fan_size)/2-fan_offset,(fan_size)/2,0])
    rounded_rect(heater_size, heater_size, (heater_size-heater_straight)/2,grill_thickness );
    // translate([(fan_size-heater_size)/2,(fan_size-heater_size)/2,0])
    
    // cube([heater_size, heater_size, grill_thickness+1]);

    translate([(fan_size-heater_size)/2+tab_offset-fan_offset,(fan_size-heater_size)/2+heater_size,0])
    cube([tab_width,tab_height,tab_offset]);
    translate([(fan_size-heater_size)/2+heater_size-tab_width-tab_offset-fan_offset,0,0])
    cube([tab_width,tab_height,tab_offset]);
    translate([hole_height,screw_center_distance_from_edge+screw_hole_radius_wider+wall_size,0])
    cube([fan_size-hole_height, hole_width ,grill_thickness]);
    translate([past_screw,wall_size,0])
    cube([fan_size-wall_size-past_screw*2, side_size_diff, grill_thickness]);

    translate([past_screw,fan_size-side_size_diff-wall_size,0])
    cube([fan_size-wall_size-past_screw*2, side_size_diff, grill_thickness]);
}
